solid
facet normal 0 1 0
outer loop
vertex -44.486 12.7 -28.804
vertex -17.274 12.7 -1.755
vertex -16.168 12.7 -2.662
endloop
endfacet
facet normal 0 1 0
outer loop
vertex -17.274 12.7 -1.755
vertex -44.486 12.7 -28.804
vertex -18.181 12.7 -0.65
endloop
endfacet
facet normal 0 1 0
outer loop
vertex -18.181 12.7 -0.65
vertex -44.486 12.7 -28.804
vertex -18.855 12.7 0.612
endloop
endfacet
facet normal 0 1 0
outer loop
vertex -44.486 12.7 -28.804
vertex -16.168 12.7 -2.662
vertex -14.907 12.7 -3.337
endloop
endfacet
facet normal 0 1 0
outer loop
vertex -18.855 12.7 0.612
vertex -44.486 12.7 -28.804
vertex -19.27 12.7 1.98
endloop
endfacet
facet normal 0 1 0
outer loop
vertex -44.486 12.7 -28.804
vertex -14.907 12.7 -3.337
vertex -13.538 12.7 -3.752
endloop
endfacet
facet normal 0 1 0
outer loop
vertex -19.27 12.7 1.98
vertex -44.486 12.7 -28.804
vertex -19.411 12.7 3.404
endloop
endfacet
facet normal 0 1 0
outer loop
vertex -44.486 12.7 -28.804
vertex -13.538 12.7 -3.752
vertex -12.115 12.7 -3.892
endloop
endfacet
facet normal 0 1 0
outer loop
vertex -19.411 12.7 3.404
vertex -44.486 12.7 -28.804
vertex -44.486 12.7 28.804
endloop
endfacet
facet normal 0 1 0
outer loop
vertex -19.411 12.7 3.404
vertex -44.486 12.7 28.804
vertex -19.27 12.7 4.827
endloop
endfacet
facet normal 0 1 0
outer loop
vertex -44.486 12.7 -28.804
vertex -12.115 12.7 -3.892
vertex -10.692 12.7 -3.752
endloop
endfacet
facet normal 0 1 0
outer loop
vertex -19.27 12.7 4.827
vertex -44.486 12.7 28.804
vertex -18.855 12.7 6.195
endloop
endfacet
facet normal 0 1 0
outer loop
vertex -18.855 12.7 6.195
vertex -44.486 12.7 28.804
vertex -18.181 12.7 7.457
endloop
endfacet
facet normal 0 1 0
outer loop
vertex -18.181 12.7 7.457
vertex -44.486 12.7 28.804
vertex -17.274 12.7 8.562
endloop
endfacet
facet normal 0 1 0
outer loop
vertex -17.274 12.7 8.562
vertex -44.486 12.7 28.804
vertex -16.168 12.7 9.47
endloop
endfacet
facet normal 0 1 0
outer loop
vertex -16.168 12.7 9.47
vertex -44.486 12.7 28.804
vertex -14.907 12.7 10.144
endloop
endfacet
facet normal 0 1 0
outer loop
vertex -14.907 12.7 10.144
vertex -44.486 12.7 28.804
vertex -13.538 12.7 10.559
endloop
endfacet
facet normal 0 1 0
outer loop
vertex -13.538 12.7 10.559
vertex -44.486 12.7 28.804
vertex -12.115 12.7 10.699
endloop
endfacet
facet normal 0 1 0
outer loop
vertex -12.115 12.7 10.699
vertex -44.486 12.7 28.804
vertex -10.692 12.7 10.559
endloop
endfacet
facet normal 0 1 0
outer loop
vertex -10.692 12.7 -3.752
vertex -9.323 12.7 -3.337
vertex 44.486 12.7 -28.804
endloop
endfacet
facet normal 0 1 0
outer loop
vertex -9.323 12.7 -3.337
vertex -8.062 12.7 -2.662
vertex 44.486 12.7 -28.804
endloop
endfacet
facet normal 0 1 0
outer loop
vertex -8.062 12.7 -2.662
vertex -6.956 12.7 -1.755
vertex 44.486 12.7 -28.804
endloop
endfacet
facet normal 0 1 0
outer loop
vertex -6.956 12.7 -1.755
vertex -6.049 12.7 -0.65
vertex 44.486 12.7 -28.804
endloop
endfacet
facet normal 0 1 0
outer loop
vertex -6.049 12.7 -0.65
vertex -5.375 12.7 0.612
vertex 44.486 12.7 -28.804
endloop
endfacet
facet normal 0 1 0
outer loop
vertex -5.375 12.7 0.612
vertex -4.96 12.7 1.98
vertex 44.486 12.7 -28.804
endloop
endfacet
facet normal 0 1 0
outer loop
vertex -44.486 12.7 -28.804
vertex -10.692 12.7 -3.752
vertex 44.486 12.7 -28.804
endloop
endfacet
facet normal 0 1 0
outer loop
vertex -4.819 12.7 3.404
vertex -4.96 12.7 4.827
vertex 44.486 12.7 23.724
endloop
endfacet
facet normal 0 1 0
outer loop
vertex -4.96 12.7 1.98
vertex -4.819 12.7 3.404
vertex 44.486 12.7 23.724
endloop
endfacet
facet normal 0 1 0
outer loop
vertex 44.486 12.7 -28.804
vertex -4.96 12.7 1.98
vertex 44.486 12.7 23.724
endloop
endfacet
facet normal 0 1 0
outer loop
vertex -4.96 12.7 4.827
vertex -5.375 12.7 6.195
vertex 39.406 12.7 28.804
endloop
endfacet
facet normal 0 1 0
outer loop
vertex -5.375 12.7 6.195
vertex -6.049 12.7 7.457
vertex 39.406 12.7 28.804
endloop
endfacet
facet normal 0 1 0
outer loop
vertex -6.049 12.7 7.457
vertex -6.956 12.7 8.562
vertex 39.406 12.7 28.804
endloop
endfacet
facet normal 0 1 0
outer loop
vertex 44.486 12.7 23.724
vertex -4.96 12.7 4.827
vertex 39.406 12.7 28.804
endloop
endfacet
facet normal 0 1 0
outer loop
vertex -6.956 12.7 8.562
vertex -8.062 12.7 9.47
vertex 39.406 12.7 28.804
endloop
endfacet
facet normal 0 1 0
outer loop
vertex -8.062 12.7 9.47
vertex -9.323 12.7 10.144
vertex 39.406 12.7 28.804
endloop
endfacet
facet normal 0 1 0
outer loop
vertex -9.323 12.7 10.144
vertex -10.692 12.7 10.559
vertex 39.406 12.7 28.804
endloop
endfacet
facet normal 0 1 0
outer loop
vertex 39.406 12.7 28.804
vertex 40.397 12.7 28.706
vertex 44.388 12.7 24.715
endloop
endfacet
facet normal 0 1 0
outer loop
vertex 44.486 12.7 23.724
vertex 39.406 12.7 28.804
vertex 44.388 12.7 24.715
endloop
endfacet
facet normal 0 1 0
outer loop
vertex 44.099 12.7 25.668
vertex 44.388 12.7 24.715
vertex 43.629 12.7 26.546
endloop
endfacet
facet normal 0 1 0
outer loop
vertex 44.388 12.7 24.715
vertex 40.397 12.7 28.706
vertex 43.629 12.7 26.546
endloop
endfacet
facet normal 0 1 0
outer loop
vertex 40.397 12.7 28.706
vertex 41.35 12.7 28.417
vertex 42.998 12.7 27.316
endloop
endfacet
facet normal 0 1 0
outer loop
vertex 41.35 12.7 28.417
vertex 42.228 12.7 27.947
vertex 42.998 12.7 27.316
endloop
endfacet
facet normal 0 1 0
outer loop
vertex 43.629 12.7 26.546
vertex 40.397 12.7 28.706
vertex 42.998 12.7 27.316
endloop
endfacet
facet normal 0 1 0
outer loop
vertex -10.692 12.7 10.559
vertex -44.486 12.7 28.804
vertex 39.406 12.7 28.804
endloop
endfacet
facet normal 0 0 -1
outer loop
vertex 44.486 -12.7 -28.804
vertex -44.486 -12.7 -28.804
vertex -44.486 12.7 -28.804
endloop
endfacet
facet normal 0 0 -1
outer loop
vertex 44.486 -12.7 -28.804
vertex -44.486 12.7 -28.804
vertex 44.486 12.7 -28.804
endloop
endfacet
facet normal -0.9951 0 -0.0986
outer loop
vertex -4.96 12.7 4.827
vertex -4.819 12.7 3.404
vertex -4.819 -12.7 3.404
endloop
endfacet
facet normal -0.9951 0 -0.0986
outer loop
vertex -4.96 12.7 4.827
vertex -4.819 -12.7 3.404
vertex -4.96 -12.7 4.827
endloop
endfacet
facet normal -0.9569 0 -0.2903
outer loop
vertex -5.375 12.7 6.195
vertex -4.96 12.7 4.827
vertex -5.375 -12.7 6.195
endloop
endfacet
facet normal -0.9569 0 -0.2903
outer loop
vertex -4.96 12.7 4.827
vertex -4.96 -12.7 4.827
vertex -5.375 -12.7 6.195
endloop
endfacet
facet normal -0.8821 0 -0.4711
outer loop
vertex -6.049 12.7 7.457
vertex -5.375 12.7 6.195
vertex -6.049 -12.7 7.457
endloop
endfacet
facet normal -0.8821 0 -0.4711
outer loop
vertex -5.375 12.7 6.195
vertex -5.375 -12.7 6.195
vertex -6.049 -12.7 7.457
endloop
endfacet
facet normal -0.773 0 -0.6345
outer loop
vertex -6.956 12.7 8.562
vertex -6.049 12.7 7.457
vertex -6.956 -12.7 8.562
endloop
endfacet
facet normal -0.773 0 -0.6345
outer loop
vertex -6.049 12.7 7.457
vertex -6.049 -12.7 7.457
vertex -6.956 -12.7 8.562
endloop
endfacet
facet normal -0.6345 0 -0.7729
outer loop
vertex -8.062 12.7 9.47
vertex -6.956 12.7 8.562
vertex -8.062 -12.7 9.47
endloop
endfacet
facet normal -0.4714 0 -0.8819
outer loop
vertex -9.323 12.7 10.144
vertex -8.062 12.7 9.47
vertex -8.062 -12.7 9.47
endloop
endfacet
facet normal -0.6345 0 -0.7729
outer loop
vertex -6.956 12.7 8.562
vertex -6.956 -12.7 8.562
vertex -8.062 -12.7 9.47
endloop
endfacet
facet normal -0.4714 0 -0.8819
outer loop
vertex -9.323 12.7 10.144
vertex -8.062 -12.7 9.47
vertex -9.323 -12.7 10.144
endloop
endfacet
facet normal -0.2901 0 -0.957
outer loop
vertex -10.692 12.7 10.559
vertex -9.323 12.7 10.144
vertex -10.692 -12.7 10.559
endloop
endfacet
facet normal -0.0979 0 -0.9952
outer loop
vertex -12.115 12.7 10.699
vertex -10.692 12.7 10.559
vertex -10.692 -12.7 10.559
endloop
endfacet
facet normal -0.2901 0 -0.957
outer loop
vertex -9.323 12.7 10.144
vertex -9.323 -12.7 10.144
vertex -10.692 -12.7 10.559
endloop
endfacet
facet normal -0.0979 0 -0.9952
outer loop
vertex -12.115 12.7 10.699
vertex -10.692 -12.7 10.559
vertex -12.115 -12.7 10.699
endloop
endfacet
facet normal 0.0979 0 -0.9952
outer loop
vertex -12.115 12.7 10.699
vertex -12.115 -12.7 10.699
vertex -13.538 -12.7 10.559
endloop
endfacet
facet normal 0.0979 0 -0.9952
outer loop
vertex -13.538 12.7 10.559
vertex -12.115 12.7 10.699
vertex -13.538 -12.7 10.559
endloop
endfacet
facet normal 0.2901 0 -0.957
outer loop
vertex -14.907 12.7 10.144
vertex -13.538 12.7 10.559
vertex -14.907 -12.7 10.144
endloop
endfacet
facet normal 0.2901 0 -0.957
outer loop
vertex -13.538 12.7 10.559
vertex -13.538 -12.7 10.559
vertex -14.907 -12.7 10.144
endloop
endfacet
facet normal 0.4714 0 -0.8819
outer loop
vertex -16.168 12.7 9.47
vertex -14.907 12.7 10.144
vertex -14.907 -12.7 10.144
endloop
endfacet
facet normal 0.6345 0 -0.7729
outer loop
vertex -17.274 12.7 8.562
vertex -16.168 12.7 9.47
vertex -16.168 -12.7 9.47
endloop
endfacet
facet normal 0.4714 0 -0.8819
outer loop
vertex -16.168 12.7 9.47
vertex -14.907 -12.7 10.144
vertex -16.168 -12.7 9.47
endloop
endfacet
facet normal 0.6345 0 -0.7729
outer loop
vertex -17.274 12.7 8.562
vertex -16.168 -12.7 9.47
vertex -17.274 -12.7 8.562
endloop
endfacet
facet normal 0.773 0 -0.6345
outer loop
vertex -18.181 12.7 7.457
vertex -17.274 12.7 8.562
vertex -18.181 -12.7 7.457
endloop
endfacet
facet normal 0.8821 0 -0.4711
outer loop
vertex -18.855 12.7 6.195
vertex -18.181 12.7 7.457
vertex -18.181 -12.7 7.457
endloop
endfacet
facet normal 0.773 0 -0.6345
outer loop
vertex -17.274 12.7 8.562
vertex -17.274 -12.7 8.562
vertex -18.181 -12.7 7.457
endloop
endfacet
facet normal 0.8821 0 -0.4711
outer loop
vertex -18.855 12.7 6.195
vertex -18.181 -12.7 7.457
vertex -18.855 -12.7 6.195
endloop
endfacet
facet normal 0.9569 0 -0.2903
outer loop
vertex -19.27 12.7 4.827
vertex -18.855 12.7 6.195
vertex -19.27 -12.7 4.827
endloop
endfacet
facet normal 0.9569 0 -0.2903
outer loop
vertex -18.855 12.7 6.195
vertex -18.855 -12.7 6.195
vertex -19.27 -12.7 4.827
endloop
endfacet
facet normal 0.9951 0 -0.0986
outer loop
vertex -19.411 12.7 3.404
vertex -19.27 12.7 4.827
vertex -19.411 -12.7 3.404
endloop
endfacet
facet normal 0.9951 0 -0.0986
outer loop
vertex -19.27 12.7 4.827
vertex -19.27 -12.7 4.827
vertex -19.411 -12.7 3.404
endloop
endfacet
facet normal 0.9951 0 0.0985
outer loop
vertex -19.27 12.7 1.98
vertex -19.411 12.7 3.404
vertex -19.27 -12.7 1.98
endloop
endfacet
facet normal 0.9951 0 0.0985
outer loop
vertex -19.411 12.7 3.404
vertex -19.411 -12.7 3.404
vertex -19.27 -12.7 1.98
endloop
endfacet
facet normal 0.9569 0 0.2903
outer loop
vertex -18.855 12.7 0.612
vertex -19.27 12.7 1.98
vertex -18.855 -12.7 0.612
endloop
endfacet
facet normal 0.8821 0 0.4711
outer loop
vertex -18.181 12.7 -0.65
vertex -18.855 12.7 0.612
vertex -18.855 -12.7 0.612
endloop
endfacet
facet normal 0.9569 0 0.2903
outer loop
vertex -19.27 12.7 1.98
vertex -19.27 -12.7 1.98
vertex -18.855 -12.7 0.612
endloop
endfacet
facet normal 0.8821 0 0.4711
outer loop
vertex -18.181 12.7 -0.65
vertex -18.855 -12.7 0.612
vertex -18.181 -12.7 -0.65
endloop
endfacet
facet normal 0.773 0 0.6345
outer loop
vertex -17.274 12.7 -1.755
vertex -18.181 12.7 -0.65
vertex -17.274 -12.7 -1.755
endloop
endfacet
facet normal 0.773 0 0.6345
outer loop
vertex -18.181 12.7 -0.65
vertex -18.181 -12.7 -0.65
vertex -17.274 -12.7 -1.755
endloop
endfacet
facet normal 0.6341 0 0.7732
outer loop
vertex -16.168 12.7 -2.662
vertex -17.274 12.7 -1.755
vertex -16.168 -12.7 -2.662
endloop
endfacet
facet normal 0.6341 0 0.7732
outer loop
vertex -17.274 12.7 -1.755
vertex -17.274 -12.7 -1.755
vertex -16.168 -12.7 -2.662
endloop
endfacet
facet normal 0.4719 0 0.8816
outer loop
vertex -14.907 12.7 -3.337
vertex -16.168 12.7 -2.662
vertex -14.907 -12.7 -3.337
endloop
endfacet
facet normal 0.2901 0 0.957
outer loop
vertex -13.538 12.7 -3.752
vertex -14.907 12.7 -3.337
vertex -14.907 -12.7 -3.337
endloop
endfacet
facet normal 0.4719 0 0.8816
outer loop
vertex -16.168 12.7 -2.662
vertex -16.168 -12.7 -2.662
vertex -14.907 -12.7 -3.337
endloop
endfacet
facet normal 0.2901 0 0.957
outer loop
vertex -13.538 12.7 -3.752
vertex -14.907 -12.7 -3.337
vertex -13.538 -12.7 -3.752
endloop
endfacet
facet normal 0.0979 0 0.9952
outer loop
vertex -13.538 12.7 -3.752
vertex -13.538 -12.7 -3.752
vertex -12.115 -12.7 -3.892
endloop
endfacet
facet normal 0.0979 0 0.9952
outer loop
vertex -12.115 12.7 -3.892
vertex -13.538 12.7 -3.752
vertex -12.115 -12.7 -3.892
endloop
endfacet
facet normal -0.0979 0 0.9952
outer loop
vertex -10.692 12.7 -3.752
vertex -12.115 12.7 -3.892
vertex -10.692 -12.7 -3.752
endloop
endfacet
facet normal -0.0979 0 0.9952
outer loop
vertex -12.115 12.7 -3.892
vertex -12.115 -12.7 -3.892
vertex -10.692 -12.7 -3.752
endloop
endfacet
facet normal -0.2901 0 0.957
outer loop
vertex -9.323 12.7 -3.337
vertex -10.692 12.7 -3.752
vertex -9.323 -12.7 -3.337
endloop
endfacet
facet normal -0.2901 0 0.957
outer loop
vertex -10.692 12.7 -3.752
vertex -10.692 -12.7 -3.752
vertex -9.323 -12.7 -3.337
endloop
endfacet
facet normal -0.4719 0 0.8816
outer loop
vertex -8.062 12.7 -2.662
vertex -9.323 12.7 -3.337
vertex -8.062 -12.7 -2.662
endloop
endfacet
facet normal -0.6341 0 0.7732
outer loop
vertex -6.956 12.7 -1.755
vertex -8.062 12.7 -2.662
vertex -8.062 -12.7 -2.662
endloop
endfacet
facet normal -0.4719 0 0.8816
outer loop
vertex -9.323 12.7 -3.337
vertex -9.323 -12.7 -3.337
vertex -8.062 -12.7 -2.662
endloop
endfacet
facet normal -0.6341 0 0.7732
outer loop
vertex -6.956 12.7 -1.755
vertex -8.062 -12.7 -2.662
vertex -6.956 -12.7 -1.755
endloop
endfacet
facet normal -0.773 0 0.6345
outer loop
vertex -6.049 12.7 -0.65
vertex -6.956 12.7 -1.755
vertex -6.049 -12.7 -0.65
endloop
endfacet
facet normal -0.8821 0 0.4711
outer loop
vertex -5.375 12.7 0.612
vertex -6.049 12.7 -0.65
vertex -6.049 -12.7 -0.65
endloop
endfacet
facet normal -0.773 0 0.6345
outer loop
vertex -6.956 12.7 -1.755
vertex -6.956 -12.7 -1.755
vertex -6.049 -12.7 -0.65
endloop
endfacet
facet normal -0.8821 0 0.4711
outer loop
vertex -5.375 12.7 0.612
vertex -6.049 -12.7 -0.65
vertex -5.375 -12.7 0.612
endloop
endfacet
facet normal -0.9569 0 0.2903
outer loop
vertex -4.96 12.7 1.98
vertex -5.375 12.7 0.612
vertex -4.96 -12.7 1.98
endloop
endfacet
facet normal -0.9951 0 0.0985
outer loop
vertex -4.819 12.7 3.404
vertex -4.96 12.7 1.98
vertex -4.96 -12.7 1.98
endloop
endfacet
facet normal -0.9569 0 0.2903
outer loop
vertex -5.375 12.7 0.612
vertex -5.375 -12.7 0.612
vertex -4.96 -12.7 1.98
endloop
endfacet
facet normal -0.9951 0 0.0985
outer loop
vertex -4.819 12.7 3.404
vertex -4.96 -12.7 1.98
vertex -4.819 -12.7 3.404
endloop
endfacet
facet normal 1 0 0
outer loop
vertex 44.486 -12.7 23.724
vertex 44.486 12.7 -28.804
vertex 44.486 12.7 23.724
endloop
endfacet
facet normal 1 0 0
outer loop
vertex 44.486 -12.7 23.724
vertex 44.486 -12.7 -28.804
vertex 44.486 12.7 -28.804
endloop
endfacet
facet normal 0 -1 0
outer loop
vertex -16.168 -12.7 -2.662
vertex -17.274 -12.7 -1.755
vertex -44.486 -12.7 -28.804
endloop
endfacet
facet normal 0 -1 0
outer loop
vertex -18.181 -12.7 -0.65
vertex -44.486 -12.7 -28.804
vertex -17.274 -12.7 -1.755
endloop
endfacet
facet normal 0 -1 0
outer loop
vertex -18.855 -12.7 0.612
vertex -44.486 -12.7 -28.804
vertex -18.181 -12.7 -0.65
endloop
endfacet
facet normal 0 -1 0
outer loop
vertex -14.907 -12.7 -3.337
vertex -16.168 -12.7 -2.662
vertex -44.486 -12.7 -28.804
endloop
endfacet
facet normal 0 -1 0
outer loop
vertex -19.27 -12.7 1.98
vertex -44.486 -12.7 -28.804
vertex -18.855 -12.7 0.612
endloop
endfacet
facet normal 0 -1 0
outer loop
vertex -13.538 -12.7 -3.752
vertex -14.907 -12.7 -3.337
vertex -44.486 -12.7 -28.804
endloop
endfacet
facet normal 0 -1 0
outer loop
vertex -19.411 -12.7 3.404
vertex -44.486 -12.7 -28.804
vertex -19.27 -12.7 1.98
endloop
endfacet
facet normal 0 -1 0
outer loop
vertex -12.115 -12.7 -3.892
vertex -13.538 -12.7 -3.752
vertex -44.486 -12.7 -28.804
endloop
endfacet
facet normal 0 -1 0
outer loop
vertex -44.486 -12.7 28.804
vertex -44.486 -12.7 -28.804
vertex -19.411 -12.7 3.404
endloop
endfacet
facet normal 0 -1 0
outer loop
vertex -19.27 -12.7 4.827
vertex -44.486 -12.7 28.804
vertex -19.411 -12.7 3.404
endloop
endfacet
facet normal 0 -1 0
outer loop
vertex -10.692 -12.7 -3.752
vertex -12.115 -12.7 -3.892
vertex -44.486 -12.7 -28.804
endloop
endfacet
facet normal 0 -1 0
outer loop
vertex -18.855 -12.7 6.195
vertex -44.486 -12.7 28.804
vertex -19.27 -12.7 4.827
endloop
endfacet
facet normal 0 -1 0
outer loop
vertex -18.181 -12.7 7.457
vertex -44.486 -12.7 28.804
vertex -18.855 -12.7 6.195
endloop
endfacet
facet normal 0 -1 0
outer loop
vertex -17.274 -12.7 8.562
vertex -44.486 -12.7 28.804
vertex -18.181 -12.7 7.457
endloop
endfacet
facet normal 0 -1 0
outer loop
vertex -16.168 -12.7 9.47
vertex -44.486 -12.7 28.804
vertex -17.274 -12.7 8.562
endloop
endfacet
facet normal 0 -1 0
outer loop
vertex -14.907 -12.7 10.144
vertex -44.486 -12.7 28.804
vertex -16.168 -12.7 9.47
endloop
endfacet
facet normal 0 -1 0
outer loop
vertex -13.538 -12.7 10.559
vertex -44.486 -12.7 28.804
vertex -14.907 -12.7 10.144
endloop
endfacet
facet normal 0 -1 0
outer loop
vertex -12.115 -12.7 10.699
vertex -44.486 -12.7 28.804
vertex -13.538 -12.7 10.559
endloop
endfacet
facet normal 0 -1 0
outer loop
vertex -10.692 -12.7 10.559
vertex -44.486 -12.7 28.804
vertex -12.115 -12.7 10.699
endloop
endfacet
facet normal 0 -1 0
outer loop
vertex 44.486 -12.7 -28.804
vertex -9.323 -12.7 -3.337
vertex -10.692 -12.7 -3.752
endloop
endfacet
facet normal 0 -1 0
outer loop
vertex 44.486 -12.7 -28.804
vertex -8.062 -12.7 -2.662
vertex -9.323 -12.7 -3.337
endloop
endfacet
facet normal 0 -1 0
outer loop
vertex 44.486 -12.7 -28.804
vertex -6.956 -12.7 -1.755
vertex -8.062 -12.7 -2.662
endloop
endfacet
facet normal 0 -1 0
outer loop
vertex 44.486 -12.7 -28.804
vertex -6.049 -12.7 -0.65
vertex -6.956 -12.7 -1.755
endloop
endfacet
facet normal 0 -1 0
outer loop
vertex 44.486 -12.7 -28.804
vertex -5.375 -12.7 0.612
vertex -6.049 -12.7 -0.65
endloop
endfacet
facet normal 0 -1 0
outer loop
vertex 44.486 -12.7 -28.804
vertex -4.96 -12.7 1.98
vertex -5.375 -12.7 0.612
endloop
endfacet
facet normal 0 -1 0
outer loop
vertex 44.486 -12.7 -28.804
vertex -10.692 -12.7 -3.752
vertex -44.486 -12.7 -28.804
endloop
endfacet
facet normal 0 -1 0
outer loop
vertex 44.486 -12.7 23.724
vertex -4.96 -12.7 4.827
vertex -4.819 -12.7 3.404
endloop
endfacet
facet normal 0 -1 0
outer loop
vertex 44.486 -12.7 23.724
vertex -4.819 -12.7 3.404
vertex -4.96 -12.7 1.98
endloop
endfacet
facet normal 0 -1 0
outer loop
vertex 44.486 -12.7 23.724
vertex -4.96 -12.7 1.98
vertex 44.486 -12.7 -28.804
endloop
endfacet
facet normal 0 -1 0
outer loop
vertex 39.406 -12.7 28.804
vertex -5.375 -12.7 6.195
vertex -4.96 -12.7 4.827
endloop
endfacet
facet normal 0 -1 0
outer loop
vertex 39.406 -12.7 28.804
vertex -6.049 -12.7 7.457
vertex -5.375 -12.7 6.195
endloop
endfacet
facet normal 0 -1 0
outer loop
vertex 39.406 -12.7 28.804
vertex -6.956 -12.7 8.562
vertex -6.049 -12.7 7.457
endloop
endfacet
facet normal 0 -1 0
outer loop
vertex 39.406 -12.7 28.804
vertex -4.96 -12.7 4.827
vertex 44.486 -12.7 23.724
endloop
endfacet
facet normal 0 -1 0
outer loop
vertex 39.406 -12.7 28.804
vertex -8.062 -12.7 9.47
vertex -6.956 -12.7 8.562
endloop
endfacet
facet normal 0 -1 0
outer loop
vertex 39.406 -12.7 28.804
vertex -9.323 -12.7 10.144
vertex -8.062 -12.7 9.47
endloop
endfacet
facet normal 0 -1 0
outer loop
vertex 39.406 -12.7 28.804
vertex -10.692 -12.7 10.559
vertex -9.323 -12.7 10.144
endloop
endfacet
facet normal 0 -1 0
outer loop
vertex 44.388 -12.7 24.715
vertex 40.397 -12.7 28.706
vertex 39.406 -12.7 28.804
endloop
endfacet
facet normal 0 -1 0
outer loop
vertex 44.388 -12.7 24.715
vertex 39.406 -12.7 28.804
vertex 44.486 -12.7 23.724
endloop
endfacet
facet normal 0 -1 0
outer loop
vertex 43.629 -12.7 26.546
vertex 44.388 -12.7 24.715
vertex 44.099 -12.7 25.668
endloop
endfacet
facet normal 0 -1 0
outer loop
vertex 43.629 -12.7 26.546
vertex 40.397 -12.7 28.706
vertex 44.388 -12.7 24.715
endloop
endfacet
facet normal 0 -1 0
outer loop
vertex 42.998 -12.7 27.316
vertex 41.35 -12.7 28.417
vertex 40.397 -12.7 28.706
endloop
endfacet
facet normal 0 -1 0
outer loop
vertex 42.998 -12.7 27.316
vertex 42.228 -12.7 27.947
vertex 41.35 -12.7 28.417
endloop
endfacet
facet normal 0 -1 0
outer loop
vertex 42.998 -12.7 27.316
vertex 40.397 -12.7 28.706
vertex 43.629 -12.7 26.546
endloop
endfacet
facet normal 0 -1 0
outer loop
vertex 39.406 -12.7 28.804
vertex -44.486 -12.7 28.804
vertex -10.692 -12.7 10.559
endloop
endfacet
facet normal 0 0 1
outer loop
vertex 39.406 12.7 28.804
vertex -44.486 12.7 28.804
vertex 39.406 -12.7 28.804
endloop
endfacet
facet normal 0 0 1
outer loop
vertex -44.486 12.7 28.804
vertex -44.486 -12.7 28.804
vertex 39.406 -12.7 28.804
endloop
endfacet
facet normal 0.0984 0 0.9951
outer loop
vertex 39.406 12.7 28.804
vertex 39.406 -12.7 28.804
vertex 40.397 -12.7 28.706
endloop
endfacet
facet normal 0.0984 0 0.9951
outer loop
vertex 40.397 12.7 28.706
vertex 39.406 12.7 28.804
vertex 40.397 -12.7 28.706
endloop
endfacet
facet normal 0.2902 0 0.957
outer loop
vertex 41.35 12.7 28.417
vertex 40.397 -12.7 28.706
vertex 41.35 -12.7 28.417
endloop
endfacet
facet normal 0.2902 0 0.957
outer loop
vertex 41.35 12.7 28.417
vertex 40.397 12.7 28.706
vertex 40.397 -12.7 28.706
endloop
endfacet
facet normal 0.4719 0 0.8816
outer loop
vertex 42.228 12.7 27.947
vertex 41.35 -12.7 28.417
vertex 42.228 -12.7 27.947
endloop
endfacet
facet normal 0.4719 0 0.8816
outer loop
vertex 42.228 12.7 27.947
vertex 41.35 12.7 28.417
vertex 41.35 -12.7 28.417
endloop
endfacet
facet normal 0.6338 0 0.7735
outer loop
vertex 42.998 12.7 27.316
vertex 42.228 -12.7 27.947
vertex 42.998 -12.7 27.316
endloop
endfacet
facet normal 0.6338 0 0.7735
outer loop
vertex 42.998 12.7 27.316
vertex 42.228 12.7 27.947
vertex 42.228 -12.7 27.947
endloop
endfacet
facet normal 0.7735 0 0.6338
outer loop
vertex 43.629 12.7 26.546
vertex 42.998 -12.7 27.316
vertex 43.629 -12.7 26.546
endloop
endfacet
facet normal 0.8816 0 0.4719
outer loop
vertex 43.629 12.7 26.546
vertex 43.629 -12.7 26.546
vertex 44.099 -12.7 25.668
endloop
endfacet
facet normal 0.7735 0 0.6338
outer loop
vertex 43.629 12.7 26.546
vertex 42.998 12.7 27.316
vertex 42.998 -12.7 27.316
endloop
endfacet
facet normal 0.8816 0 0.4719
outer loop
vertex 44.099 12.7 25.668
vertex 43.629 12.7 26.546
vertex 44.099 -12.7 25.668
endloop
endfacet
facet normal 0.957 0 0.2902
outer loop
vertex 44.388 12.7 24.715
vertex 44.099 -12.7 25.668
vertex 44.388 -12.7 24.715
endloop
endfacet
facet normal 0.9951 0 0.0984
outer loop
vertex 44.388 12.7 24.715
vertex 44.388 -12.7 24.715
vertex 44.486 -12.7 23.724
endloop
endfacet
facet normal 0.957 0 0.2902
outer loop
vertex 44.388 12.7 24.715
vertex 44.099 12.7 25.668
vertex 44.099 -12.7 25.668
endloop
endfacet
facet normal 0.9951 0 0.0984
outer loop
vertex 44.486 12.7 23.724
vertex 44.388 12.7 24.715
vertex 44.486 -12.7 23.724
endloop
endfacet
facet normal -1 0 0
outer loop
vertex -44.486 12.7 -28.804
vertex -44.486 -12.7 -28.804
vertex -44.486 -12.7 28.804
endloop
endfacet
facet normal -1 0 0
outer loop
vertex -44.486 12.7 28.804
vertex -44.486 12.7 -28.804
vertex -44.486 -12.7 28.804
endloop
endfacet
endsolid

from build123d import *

# Parameters (mm, degrees)
F0_W     = 88.971116
F0_H     = 57.607204
F1_DEPTH = 12.7
F2_R     = 7.295554
F3_DEPTH = 25.4
F4_R     = 5.08


with BuildPart() as f1:
    # F0 (on Front) → F1 (new body, symmetric)
    with BuildSketch(Plane.XZ):
        Rectangle(F0_W, F0_H)
    extrude(amount=F1_DEPTH, both=True)

    # F2 (on face) → F3 (cut, through all)
    with BuildSketch(Plane.XZ.offset(12.7)):
        with Locations((-12.114964, 3.403602)):
            Circle(F2_R)
    extrude(amount=-F3_DEPTH, mode=Mode.SUBTRACT)

    # F4
    f4_edges = [f1.edges().sort_by_distance(p)[0] for p in [
        (44.485558, 0, 28.803602),
    ]]
    fillet(f4_edges, radius=F4_R)


solid = f1.part
